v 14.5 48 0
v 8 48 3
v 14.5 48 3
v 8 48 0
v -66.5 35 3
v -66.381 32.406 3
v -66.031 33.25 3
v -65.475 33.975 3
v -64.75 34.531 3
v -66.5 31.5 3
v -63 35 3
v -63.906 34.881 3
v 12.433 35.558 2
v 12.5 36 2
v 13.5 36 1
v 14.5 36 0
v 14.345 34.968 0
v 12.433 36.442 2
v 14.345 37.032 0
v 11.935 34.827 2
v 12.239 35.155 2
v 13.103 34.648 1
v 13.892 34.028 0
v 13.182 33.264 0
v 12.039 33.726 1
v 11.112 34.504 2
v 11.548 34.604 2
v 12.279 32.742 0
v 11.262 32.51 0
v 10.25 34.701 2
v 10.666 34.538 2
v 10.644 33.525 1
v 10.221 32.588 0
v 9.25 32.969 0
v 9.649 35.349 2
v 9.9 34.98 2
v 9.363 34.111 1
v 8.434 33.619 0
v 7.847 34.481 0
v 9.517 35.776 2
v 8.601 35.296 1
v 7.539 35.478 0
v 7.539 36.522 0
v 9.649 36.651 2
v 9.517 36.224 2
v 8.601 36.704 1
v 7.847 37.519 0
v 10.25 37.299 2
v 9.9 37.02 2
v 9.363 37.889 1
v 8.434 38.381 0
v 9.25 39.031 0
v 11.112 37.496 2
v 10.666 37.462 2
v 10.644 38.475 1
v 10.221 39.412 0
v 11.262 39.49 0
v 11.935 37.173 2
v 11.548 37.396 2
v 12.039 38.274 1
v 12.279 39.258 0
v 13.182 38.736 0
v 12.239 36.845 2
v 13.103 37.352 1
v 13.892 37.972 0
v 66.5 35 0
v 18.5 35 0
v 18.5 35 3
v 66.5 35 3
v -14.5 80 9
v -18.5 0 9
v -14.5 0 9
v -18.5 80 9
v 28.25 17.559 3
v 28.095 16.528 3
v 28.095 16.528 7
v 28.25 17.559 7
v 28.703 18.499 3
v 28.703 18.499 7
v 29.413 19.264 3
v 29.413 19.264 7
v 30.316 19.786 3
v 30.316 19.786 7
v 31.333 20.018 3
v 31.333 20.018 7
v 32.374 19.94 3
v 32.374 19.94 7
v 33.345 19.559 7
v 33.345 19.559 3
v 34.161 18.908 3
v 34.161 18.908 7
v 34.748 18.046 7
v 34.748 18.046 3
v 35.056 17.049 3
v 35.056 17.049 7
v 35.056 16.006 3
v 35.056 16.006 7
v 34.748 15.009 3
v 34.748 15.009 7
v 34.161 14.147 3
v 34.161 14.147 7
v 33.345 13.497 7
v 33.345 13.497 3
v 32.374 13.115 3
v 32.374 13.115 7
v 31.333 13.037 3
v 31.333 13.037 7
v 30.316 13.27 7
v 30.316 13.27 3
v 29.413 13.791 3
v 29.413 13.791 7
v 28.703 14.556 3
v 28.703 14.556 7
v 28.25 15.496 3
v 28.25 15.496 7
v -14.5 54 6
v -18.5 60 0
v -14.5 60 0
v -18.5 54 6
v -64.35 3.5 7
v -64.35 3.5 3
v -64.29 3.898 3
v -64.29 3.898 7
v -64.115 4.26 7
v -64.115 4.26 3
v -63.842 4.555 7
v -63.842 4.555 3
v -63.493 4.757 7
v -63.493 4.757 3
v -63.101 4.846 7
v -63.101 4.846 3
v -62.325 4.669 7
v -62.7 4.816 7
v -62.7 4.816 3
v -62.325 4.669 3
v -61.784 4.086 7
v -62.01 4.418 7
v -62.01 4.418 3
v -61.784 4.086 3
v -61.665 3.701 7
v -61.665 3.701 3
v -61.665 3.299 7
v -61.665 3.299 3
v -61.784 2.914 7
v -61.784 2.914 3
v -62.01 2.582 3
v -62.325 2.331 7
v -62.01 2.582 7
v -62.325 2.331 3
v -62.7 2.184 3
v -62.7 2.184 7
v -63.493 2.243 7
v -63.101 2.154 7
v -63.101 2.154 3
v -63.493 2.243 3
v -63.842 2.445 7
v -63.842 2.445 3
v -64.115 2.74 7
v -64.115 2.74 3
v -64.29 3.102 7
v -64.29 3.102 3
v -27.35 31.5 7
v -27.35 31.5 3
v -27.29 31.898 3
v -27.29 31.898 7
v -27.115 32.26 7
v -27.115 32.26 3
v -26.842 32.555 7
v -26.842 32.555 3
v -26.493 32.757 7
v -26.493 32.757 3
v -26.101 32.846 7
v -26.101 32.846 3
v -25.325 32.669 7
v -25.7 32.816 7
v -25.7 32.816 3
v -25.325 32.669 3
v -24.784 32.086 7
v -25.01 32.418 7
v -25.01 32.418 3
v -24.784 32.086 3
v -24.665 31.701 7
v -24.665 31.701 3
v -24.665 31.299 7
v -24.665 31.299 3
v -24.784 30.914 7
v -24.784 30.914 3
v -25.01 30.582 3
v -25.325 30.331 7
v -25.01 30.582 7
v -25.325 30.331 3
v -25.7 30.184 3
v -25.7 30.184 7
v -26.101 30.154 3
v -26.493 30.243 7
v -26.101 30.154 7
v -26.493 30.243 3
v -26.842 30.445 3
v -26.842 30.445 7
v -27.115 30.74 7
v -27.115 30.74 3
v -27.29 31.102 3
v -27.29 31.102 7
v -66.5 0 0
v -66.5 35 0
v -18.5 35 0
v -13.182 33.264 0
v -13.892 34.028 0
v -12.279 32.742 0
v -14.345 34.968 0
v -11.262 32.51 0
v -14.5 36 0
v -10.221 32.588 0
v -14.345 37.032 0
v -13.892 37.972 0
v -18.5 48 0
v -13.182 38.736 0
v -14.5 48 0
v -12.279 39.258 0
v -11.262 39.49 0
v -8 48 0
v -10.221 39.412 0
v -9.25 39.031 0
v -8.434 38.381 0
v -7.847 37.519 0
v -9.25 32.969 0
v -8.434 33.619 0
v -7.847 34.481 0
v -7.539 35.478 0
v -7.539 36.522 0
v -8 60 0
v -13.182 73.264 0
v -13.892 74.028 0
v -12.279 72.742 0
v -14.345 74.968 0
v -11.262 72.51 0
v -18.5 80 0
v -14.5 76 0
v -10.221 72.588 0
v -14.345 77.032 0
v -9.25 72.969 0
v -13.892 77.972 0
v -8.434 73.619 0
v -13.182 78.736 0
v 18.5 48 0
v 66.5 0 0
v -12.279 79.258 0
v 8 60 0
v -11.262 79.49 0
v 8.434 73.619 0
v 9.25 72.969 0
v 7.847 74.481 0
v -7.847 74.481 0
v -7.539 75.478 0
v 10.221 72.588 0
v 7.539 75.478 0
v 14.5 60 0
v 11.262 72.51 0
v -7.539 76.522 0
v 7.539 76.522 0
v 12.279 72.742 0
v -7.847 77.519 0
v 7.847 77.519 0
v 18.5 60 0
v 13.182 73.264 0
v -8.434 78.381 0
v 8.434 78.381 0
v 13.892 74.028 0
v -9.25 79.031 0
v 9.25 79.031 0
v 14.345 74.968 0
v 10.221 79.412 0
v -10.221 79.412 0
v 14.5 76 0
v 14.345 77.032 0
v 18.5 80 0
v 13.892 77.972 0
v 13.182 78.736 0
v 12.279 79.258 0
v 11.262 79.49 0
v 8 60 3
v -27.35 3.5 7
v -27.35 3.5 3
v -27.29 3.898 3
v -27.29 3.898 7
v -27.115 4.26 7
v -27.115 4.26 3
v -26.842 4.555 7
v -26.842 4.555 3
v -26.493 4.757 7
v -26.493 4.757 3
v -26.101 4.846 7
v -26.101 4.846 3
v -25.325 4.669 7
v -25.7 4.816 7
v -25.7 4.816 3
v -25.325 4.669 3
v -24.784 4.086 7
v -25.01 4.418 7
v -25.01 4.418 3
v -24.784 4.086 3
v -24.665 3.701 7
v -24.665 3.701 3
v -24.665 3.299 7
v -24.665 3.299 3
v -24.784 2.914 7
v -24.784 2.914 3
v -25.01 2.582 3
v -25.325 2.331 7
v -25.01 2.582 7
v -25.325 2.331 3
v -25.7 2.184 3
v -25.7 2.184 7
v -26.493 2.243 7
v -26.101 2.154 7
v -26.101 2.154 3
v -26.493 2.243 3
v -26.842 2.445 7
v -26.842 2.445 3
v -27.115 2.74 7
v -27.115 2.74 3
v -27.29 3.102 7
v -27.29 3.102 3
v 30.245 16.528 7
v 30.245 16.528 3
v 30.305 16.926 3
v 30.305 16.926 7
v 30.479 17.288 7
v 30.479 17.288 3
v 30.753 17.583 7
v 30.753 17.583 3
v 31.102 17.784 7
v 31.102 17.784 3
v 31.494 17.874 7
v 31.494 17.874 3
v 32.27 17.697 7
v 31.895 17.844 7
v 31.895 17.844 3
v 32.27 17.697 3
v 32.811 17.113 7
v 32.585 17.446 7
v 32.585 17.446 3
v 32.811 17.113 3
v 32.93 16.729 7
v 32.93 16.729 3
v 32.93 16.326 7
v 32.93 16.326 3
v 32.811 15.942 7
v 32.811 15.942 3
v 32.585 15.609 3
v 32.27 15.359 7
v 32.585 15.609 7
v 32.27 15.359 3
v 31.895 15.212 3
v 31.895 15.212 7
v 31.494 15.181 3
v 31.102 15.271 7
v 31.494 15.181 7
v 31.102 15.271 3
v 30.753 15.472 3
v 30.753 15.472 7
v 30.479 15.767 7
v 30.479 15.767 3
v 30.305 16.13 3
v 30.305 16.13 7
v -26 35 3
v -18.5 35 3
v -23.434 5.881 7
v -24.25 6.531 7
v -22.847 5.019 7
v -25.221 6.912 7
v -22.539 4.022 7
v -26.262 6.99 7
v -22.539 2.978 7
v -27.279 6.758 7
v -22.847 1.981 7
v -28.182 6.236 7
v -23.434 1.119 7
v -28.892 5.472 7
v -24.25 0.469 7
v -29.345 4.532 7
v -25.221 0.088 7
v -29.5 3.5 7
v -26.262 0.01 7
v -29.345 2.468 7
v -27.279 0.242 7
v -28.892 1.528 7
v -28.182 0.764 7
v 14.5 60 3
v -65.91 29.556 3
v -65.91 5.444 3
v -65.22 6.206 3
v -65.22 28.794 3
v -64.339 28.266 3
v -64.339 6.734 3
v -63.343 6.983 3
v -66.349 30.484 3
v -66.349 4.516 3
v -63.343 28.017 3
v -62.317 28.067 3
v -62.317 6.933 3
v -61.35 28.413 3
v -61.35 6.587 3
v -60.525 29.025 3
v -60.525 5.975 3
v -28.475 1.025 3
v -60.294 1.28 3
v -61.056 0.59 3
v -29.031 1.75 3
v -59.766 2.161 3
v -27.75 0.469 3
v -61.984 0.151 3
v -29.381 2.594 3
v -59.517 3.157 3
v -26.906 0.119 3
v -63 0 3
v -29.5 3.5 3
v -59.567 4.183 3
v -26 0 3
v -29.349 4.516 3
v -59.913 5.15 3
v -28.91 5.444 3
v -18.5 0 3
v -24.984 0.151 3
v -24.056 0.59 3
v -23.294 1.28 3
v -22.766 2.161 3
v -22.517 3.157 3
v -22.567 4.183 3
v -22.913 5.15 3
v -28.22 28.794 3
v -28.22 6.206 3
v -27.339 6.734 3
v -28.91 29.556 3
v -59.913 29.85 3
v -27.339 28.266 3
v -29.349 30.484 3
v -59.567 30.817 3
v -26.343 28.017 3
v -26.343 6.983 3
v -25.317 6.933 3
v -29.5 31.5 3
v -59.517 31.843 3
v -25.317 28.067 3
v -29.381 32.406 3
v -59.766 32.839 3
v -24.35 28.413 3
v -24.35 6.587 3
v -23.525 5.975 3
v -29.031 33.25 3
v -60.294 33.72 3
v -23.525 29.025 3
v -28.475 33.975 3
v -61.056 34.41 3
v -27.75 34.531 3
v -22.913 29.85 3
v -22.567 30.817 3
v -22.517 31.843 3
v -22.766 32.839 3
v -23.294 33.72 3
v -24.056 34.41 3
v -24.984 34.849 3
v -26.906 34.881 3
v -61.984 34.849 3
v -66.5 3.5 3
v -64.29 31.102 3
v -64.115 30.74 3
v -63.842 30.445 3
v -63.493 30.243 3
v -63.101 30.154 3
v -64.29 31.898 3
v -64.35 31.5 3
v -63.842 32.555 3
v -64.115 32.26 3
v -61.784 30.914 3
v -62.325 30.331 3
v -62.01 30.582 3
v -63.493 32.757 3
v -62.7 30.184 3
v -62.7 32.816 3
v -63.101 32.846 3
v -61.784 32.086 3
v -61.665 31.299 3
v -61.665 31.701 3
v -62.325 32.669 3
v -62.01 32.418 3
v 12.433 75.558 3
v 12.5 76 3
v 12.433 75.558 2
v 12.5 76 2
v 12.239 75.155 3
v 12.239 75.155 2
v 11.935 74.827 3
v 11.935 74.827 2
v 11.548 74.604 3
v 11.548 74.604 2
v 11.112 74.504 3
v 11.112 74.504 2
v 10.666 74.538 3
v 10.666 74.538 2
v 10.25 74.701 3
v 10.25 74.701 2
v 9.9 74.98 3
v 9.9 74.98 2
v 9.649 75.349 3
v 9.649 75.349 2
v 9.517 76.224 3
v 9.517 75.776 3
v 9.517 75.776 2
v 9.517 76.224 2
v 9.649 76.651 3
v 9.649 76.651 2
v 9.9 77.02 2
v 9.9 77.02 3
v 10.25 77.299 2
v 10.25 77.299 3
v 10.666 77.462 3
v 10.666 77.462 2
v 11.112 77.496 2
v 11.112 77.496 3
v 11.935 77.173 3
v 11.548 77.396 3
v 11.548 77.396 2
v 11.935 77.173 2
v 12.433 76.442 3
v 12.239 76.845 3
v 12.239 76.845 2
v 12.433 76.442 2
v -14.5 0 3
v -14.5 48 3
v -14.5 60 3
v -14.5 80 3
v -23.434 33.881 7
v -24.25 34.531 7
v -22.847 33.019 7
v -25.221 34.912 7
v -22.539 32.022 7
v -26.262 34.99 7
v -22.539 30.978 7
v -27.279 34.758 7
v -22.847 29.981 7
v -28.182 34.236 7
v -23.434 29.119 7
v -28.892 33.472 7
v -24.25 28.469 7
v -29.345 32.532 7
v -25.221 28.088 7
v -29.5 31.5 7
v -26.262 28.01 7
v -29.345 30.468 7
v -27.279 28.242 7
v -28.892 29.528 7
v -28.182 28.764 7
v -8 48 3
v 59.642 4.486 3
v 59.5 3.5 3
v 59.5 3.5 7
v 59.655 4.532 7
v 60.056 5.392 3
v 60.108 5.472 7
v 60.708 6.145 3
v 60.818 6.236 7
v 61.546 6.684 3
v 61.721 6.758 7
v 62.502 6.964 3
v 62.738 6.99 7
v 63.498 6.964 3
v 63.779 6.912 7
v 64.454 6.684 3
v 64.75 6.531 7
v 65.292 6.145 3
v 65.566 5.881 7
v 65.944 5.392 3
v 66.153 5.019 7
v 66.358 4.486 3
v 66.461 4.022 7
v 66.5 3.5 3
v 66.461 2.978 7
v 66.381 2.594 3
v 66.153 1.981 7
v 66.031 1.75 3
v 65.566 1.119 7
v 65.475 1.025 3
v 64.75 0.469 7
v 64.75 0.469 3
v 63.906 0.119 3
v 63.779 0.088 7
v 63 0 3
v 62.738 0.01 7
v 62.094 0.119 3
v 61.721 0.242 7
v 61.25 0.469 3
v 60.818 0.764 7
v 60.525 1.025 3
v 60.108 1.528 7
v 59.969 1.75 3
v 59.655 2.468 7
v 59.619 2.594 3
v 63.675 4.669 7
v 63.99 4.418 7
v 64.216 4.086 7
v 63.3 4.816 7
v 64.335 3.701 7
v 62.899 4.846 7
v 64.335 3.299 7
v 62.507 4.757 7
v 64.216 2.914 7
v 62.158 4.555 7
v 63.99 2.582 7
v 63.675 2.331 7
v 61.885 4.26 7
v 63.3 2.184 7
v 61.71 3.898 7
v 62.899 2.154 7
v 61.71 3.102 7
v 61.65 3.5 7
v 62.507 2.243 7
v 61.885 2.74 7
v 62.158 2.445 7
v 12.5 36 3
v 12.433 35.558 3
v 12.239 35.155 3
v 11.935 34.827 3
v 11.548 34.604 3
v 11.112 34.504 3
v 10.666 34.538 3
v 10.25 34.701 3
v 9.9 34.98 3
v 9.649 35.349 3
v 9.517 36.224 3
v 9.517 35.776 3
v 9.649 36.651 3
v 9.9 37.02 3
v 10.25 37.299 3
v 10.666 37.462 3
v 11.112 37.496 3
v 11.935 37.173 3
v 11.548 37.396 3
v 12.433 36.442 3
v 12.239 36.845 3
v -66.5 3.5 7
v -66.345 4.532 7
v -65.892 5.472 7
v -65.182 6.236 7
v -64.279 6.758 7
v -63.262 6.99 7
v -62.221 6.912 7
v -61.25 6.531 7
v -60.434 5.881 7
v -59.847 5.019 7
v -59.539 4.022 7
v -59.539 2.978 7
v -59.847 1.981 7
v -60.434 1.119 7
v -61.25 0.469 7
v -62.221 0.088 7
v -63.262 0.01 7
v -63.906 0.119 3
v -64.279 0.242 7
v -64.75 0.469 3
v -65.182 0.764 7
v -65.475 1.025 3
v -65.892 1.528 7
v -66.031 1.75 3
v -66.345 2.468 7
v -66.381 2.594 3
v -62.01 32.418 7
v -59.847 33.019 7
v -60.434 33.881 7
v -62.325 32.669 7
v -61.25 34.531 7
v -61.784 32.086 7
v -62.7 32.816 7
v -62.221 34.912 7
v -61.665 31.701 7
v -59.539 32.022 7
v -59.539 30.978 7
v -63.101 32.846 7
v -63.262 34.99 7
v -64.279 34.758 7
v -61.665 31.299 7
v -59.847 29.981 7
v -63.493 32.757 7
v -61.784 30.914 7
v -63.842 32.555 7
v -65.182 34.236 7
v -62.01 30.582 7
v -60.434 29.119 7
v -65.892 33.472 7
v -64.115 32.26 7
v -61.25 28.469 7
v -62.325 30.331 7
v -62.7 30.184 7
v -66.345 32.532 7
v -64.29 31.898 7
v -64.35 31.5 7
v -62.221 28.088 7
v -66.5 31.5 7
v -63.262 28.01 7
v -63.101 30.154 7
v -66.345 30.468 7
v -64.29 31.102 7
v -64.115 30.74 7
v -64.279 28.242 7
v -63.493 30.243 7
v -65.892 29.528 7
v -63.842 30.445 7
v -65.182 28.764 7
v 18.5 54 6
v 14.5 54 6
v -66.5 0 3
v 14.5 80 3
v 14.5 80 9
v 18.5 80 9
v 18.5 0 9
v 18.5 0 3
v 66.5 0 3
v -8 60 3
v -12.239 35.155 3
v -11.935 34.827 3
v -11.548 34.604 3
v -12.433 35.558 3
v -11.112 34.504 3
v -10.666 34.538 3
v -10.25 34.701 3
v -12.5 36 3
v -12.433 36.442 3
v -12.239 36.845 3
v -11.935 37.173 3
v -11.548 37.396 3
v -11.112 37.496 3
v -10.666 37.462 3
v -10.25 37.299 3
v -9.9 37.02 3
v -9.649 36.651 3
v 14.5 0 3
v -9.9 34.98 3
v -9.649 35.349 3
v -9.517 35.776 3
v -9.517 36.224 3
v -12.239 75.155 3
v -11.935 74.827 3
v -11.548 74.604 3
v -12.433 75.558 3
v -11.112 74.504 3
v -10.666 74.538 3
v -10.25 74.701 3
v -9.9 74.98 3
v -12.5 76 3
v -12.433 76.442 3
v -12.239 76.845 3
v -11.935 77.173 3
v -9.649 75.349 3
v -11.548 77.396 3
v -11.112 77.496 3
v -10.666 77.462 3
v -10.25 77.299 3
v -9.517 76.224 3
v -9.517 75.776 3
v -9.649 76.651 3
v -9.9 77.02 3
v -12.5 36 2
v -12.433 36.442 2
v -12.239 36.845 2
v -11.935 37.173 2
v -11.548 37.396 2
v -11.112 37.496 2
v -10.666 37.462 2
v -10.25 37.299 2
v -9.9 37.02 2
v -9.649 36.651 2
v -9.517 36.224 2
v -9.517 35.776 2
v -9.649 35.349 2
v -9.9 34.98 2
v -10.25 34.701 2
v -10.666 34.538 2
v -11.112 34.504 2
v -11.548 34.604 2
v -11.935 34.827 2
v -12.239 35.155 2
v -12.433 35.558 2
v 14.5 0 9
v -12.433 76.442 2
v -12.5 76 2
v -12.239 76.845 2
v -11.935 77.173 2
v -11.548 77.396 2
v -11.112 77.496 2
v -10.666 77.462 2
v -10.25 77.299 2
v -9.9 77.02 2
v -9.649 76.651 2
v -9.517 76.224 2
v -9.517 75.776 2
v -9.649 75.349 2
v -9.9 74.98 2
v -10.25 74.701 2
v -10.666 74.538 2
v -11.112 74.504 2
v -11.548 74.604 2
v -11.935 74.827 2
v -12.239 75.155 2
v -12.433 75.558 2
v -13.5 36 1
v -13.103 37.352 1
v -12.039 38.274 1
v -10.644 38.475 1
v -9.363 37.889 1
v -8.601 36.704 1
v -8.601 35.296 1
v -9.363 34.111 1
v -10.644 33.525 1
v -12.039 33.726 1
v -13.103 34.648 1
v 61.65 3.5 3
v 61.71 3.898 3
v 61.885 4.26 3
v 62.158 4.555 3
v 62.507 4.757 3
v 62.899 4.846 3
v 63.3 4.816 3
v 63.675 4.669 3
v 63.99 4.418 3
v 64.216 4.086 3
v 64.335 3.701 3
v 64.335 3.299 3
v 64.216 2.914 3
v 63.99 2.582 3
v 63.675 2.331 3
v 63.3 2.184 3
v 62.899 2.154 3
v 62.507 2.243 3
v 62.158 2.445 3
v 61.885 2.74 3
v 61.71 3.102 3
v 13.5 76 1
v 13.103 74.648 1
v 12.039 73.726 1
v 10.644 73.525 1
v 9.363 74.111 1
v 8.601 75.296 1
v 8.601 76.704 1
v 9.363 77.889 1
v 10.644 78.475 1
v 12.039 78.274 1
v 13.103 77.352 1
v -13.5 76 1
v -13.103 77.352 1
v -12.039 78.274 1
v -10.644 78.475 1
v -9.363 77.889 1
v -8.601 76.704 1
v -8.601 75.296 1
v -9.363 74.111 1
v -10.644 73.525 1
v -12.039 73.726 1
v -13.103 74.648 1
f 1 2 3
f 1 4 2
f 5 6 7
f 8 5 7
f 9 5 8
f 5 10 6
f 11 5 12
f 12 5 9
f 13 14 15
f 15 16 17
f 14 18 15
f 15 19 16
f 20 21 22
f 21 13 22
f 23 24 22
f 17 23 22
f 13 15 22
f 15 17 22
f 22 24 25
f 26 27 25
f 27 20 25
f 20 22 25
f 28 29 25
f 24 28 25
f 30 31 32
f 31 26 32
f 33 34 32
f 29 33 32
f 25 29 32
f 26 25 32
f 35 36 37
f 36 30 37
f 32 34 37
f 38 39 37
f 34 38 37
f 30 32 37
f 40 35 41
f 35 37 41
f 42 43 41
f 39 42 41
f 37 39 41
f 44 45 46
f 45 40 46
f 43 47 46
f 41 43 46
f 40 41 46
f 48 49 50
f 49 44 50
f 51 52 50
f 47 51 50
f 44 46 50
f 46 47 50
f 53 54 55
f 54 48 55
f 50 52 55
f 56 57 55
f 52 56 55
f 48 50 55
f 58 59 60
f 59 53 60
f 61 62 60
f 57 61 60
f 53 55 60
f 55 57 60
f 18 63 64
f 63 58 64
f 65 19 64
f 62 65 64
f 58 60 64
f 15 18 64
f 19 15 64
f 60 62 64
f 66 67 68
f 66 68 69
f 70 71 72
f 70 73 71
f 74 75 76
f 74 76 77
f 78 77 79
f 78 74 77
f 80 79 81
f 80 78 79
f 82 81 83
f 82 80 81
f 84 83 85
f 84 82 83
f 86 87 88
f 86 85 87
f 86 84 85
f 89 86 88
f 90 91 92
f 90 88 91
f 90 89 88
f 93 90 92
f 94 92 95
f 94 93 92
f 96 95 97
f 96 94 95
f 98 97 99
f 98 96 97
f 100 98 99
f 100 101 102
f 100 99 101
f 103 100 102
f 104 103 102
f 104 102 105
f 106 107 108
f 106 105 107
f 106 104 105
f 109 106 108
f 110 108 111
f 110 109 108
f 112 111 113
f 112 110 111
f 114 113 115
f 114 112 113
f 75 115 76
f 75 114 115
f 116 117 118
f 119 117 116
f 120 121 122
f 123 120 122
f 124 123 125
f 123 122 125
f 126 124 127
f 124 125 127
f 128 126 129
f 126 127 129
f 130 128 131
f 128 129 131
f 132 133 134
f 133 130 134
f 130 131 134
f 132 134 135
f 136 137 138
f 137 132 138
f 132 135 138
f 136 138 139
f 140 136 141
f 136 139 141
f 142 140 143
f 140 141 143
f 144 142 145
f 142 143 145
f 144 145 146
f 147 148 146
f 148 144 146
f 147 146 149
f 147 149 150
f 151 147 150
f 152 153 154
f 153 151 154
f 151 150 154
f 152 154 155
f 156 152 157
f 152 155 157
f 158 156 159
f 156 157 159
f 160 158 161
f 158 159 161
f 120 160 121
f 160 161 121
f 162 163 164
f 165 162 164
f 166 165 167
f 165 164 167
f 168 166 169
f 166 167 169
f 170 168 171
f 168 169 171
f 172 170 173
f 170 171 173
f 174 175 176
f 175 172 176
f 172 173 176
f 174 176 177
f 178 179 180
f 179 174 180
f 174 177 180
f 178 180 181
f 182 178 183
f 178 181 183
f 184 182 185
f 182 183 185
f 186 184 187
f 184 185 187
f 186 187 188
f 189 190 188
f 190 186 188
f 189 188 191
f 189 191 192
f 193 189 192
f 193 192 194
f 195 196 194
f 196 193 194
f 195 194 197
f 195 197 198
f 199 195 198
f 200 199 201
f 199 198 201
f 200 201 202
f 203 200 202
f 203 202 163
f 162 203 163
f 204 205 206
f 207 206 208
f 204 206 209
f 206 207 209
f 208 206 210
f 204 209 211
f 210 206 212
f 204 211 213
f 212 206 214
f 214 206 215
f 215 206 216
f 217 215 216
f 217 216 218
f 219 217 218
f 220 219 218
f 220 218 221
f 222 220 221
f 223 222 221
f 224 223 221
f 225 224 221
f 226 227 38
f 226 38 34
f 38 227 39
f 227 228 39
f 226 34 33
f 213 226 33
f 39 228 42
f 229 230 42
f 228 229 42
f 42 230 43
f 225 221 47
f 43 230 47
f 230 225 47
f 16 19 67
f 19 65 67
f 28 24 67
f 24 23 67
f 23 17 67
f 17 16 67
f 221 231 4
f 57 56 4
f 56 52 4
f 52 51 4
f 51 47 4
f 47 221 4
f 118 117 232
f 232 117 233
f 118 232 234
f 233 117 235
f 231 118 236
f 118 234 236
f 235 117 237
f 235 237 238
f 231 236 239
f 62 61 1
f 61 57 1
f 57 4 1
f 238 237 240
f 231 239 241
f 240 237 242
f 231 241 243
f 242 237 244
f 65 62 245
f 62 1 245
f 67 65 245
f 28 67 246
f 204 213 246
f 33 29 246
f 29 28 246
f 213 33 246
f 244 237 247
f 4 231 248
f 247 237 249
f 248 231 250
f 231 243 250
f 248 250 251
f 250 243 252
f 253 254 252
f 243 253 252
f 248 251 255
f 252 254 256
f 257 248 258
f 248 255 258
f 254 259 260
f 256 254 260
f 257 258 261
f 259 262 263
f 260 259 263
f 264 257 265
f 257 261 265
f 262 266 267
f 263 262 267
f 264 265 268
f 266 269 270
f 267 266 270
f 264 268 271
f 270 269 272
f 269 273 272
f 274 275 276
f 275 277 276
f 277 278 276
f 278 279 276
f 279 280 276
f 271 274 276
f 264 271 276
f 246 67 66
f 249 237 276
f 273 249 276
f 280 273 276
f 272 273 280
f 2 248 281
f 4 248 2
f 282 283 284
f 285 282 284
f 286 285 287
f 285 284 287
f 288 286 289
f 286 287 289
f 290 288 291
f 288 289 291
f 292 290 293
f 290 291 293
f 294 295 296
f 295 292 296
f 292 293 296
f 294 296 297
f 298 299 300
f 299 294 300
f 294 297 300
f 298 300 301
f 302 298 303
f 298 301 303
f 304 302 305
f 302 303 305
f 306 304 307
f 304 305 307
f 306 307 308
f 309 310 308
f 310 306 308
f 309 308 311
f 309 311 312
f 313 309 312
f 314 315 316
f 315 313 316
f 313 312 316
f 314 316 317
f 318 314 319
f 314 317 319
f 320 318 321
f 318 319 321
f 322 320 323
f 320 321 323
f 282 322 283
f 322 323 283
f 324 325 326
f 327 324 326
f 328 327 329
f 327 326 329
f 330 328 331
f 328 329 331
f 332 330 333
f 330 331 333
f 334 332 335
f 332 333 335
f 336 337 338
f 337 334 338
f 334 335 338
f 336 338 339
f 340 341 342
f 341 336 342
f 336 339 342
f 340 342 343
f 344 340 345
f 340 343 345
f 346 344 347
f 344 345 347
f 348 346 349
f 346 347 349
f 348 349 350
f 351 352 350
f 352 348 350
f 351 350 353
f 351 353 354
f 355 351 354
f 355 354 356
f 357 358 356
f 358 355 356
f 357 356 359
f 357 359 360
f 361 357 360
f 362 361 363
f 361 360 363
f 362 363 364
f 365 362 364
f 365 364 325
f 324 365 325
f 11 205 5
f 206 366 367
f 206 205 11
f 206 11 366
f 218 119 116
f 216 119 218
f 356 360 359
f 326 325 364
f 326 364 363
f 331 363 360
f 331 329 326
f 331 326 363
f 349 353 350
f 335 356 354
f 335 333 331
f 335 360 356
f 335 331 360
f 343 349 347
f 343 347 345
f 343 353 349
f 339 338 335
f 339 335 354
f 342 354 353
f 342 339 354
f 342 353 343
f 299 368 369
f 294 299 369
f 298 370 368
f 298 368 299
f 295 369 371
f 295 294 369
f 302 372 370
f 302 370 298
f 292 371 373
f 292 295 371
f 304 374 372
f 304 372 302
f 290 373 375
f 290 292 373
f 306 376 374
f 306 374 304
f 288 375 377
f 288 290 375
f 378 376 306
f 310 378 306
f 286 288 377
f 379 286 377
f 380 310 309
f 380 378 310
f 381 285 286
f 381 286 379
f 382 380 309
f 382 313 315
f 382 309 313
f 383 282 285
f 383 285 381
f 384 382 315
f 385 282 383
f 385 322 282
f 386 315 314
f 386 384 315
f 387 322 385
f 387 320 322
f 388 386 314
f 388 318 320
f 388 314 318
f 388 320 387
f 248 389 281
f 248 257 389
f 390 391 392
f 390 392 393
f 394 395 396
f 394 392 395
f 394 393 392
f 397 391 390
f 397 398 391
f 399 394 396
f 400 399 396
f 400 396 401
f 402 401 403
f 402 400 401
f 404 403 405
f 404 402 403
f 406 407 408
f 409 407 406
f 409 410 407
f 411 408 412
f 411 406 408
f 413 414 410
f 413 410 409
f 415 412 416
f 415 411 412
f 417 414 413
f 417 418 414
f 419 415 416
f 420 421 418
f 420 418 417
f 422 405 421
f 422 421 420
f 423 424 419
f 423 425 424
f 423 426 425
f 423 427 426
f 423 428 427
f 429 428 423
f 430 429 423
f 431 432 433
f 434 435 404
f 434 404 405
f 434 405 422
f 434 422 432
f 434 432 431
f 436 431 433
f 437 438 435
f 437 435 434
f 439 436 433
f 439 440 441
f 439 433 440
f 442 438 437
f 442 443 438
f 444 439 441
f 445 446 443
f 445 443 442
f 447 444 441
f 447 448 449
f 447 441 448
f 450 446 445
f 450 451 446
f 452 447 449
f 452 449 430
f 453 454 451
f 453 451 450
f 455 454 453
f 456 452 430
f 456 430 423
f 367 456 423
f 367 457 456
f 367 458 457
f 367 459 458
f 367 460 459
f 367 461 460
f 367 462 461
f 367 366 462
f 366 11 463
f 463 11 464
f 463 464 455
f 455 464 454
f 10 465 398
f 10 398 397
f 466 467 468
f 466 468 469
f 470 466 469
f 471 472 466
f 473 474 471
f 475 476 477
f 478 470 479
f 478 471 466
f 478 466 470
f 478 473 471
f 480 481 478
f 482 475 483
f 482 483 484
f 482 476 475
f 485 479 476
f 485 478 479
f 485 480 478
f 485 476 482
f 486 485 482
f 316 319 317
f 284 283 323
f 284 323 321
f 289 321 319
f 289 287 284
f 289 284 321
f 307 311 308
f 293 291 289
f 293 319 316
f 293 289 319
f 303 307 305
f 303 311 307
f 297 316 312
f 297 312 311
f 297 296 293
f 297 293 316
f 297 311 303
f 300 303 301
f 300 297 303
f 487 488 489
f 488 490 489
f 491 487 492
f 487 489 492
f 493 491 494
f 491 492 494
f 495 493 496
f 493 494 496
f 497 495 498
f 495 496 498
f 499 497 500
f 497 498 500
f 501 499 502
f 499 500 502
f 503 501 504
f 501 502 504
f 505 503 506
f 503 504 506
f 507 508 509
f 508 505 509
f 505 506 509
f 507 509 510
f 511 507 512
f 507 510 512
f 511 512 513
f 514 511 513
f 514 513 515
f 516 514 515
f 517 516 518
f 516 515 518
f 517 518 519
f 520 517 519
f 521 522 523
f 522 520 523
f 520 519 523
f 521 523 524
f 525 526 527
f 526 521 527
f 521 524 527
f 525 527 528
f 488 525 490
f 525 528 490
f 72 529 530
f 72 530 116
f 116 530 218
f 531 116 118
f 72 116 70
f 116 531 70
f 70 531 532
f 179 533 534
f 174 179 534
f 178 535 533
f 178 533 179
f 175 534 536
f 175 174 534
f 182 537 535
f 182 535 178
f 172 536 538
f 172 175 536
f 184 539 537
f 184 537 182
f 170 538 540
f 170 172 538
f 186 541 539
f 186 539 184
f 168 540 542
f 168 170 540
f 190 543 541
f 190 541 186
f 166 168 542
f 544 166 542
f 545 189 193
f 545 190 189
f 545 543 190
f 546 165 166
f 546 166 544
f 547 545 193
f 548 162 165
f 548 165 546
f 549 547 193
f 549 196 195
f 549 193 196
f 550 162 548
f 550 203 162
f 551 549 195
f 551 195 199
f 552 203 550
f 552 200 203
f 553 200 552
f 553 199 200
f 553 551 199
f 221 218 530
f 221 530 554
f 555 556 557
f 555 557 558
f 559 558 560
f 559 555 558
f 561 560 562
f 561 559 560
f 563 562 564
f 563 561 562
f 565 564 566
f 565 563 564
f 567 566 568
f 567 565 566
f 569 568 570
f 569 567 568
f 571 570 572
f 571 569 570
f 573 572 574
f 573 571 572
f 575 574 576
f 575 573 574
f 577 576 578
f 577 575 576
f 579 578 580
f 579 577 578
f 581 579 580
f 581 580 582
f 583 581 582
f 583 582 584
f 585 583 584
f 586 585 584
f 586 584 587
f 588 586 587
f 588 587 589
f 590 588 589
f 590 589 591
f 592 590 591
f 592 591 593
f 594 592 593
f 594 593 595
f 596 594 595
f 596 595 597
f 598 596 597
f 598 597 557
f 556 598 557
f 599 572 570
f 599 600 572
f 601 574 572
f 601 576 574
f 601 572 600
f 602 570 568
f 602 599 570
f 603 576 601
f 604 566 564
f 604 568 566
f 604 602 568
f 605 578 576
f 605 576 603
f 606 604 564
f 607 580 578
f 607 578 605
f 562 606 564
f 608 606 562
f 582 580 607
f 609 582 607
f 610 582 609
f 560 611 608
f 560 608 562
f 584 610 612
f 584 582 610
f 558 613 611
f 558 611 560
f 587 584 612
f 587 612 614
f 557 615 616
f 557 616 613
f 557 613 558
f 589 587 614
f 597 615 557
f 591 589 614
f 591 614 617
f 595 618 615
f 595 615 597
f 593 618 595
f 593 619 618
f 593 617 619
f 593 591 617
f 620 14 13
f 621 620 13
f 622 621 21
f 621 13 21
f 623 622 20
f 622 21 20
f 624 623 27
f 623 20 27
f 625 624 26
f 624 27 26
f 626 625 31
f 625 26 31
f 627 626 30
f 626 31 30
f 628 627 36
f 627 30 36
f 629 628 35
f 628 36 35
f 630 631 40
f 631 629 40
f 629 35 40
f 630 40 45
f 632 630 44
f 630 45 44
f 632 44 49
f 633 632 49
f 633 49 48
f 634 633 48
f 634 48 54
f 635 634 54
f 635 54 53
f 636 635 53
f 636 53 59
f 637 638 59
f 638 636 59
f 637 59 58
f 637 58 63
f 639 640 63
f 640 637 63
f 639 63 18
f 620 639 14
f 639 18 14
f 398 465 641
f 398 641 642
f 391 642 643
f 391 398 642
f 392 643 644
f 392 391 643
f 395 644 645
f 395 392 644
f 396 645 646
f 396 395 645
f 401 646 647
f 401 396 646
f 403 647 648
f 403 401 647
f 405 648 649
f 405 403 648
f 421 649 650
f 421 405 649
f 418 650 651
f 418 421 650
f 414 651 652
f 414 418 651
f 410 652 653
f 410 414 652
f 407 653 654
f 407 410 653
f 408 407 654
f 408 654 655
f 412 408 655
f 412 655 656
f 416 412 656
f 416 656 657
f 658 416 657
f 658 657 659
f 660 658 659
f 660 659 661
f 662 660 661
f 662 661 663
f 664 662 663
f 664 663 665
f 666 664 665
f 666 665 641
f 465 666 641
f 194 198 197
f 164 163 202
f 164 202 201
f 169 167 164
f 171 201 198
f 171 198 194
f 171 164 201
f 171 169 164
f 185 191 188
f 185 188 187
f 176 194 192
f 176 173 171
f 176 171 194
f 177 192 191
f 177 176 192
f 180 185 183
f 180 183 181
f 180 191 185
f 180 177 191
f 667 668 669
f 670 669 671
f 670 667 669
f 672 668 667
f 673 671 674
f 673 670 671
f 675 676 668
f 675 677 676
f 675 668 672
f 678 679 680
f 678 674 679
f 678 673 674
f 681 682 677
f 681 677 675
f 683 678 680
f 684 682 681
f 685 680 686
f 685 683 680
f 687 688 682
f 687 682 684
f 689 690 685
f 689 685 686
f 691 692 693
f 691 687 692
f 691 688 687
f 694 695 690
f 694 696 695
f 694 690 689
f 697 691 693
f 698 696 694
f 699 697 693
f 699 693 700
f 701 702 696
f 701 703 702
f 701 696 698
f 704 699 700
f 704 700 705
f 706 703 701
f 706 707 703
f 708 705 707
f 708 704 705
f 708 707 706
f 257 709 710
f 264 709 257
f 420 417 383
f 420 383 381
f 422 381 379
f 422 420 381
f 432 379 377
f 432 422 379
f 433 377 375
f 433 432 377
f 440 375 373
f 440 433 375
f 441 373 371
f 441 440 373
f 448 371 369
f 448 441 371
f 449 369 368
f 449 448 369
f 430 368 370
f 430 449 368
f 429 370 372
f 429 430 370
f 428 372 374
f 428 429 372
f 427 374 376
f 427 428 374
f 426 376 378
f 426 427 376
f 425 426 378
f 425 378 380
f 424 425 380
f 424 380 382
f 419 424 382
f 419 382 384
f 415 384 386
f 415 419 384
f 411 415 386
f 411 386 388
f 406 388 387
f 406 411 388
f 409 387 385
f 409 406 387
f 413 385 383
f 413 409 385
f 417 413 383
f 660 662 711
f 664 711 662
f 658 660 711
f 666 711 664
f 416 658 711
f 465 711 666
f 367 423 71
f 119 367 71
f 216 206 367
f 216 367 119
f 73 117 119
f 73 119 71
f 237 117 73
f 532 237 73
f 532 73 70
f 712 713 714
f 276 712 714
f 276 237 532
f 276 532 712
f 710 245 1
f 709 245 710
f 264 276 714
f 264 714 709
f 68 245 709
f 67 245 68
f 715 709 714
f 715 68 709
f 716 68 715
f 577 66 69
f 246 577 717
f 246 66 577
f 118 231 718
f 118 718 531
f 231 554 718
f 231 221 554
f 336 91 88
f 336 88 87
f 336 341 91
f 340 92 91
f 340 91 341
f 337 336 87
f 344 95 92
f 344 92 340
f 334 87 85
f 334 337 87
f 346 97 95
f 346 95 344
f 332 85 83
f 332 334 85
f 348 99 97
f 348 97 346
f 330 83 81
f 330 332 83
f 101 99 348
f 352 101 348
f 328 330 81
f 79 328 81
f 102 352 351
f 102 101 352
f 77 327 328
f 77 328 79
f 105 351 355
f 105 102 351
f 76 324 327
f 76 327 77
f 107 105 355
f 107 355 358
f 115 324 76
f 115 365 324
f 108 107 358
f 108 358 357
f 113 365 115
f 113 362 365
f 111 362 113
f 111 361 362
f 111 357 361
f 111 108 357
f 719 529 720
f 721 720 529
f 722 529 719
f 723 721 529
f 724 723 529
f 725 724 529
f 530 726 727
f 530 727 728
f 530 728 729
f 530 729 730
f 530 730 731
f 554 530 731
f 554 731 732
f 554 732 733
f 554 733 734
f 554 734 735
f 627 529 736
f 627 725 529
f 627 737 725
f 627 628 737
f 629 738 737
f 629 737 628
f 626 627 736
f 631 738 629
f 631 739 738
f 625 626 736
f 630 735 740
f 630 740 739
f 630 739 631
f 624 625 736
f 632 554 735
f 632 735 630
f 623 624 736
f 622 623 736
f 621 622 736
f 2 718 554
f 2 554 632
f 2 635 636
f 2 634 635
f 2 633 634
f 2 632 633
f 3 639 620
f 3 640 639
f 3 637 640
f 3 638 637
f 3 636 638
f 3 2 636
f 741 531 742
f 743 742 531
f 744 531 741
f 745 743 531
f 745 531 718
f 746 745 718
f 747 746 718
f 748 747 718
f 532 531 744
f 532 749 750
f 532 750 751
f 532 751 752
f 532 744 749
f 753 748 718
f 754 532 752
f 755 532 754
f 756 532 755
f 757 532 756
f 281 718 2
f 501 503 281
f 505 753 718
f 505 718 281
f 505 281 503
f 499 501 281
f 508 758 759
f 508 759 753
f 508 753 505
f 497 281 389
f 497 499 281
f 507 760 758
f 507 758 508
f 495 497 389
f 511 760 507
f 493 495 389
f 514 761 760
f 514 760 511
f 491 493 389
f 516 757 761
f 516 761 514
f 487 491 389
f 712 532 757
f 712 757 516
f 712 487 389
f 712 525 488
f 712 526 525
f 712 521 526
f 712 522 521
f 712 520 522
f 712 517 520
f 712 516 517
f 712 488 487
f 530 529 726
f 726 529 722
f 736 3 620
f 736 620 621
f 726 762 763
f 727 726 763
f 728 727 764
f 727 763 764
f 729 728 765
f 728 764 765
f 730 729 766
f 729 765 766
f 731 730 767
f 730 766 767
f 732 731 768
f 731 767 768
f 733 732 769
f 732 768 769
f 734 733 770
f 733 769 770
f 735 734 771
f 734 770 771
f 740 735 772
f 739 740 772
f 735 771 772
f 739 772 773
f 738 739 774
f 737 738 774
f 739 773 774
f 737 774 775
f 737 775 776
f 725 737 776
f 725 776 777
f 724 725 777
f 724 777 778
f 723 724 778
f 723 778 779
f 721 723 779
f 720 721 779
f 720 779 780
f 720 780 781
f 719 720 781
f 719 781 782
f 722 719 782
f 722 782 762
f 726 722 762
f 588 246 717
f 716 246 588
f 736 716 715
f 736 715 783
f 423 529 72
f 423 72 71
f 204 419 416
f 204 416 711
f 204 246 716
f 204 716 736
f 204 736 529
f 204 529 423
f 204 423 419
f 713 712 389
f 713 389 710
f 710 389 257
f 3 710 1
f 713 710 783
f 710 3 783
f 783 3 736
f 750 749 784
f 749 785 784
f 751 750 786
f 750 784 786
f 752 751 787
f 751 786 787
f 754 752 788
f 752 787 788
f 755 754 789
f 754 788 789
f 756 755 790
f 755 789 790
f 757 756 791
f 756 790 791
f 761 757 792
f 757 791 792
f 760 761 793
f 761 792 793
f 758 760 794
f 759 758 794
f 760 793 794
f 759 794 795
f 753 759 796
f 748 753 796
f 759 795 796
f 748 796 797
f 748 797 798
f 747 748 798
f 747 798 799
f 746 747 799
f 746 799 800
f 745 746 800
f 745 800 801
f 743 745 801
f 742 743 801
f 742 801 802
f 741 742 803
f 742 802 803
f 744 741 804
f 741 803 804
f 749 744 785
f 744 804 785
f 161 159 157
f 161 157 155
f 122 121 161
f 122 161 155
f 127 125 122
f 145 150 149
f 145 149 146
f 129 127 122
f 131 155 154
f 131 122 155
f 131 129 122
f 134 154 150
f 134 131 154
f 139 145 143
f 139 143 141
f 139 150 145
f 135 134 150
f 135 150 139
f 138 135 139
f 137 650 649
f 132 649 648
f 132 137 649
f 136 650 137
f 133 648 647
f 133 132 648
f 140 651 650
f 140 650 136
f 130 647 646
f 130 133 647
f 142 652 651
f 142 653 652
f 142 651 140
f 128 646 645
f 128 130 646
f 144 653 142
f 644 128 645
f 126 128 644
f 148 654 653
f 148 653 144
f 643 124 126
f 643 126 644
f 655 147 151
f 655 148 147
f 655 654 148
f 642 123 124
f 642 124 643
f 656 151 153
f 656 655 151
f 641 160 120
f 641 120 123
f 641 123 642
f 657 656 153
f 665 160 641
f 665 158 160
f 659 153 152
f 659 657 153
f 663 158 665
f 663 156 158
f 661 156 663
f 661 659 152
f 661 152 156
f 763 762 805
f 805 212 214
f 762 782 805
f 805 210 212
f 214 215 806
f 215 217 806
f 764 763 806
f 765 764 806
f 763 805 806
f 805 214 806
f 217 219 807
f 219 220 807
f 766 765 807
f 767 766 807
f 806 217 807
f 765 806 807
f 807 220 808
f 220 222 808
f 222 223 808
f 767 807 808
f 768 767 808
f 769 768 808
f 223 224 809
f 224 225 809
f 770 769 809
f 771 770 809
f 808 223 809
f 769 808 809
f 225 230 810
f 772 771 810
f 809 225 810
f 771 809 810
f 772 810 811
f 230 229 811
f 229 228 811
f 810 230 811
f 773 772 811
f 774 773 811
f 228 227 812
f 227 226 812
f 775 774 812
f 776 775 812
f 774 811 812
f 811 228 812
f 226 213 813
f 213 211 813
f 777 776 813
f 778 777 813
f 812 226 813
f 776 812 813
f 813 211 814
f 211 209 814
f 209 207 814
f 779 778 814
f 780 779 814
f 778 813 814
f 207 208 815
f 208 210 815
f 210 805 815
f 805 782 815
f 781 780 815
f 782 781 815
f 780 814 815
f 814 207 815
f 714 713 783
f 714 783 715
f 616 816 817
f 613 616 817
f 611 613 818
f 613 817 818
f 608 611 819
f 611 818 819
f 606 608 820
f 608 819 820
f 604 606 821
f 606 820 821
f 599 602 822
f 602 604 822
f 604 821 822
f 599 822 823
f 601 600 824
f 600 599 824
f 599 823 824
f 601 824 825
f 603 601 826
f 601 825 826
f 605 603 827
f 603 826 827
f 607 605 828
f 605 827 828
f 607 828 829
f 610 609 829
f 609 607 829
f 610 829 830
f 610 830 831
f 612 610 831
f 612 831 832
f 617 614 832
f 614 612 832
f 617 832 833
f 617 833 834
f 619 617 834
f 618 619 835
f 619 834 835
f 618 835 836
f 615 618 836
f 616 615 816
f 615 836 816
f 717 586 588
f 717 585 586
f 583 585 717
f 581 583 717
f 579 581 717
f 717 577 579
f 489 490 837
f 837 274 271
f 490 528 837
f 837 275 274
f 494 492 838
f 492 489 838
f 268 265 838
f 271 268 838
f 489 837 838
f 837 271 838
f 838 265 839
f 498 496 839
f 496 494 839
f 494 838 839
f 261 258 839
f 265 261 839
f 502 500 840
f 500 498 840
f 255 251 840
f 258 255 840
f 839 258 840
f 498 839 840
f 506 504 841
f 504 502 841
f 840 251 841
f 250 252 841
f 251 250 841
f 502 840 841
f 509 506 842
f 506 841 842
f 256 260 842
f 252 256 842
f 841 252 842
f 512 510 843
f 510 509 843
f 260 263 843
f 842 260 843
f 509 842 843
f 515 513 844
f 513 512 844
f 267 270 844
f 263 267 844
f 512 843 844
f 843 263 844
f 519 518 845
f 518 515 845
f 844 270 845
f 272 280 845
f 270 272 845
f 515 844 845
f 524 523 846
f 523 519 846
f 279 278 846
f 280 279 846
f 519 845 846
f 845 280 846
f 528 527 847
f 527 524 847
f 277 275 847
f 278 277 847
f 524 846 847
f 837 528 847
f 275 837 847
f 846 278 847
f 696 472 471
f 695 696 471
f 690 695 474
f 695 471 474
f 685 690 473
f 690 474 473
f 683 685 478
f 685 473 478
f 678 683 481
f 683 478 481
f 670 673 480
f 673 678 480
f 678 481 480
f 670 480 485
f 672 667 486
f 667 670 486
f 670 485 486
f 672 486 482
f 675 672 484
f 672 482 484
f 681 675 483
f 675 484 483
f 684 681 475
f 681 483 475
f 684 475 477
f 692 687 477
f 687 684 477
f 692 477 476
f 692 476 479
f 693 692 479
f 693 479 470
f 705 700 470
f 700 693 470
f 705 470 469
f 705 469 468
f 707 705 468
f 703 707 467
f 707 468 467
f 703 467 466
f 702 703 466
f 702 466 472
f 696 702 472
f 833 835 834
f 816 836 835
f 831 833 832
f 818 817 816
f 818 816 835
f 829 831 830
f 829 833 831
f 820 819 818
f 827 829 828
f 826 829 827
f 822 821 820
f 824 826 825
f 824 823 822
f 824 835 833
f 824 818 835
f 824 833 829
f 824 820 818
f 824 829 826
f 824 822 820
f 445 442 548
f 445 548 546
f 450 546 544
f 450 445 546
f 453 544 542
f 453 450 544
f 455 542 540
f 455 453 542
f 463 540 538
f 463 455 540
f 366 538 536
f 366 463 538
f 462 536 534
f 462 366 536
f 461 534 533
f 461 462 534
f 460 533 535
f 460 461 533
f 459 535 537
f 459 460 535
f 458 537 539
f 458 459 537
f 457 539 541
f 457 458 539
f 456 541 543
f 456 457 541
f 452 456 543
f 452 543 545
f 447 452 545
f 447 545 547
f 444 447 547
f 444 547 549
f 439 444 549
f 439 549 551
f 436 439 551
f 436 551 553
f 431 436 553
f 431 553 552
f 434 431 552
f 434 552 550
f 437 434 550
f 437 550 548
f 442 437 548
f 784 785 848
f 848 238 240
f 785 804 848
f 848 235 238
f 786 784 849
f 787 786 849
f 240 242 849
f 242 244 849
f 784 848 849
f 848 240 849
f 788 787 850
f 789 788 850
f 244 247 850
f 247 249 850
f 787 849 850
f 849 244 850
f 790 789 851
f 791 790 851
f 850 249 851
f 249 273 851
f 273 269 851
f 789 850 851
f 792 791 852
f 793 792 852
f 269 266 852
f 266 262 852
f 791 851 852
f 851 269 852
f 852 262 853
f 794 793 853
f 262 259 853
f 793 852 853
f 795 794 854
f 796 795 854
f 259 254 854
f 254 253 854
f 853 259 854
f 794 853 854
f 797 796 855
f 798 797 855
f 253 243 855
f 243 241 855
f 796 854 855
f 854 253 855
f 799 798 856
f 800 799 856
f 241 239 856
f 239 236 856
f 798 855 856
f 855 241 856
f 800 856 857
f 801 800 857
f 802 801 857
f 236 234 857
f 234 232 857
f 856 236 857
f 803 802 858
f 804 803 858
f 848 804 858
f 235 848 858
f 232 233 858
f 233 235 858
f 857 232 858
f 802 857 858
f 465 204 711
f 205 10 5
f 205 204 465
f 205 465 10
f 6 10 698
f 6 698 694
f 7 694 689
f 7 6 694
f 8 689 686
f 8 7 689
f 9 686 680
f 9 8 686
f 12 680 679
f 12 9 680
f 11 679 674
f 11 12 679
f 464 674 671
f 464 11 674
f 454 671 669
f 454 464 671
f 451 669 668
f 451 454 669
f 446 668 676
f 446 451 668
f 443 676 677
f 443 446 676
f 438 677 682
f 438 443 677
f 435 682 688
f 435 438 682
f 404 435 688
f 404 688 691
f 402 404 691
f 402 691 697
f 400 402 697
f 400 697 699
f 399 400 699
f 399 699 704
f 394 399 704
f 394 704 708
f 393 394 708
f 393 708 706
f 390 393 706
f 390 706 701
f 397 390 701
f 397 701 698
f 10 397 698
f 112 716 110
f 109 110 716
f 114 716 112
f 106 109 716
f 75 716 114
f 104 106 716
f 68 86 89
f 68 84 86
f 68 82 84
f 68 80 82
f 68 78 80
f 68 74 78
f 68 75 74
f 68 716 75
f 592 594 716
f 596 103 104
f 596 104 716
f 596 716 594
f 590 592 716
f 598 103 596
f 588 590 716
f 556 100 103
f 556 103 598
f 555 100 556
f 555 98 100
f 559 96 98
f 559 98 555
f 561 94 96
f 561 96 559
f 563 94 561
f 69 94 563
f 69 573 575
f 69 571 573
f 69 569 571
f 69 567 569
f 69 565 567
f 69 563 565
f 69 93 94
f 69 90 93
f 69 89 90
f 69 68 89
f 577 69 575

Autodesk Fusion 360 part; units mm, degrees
sketch "Sketch1" plane through (0, 0, 0) normal (0, 0, 1) x (1, 0, 0) in component "Base"
  line L0 (0, 0) -> (0, 80)
  line L1 (0, 80) -> (18.5, 80)
  line L2 (18.5, 80) -> (18.5, 35)
  line L3 (18.5, 35) -> (66.5, 35)
  line L4 (66.5, 35) -> (66.5, 0)
  line L5 (66.5, 0) -> (0, 0)
  circle A0 centre (11, 76) radius 1.5
  circle A1 centre (11, 36) radius 1.5
  line L6 (14.5, 80) -> (14.5, 0)
  line L7 (18.5, 35) -> (18.5, 0)
  line L8 (8, 60) -> (8, 48)
  line L9 (8, 48) -> (14.5, 48)
  line L10 (14.5, 48) -> (14.5, 60)
  line L11 (14.5, 60) -> (8, 60)
  dimension "d1" = 80
  dimension "d4" = 3
  dimension "d5" = 11
  dimension "d8" = 0
  dimension "d9" = -40
  dimension "d10" = 4
  dimension "d17" = 14.5
  dimension "d18" = 4
  dimension "d21" = 48
  dimension "d22" = 35
  dimension "d100" = 12
  dimension "d101" = 16
  dimension "d102" = 14.5
  dimension "d103" = 8
extrude "Extrude1" add sketch "Sketch1" along normal blind 3 contours L0 L1 L5 L6 L8 L9 L11 | L1 L2 L5 L6 L7 L10 | L3 L4 L5 L7 in component "Base"
extrude "Extrude2" add sketch "Sketch1" along normal blind 9 contours L1 L2 L5 L6 L7 L10 in component "Base"
chamfer "Chamfer1" distance 2 angle 45 2 edges at (9.6015, 76.5424, 0) (9.6015, 36.5424, 0) in component "Base"
sketch "Sketch7" plane through (18.5, 0, 0) normal (1, 0, 0) x (0, 1, 0) in component "Base"
  line L0 (35, 0) -> (80, 0)
  line L1 (80, 0) -> (80, 9)
  line L2 (80, 9) -> (0, 9)
  line L3 (0, 9) -> (0, 3)
  line L4 (0, 3) -> (35, 3)
  line L5 (35, 3) -> (35, 0)
  line L6 (48, 0) -> (54, 6)
  line L7 (54, 6) -> (60, 0)
  line L8 (48, 0) -> (60, 0)
  dimension "d104" = 45
  dimension "d105" = 45
  dimension "d106" = 20
  dimension "d107" = 12
extrude "Extrude10" cut sketch "Sketch7" against normal blind 4 contours L0 L6 L7 L8 in component "Base"
mirror "Mirror1" about plane through (0, 0, 0) normal (1, 0, 0) of bodies 1 merged in component "Base"
sketch "Sketch2" plane through (0, 0, 3) normal (0, 0, 1) x (-1, 0, 0) in component "Base"
  line L0 (18.5, 0) -> (18.5, -35)
  line L1 (18.5, -35) -> (66.5, -35)
  line L2 (66.5, -35) -> (66.5, 0)
  line L3 (66.5, 0) -> (18.5, 0)
  circle A0 centre (63, -31.5) radius 3.5
  circle A1 centre (26, -31.5) radius 3.5
  circle A2 centre (63, -3.5) radius 3.5
  circle A3 centre (26, -3.5) radius 3.5
  circle A4 centre (63, -31.5) radius 1.35
  circle A5 centre (26, -31.5) radius 1.35
  circle A6 centre (63, -3.5) radius 1.35
  circle A7 centre (26, -3.5) radius 1.35
  dimension "d23" = 7
  dimension "d26" = -37
  dimension "d27" = 28
  dimension "d97" = 2.7
extrude "Extrude3" add sketch "Sketch2" along normal blind 4 contours A1 | A3 | A2 | A0 in component "Base"
sketch "Sketch5" plane through (0, 0, 3) normal (0, 0, 1) x (-1, 0, 0) in component "Base"
  line L0 (-18.5, -35) -> (-18.5, 0)
  line L1 (-18.5, 0) -> (-66.5, 0)
  line L2 (-66.5, 0) -> (-66.5, -35)
  line L3 (-66.5, -35) -> (-18.5, -35)
  circle A0 centre (-31.5949, -16.5277) radius 3.5
  circle A1 centre (-63, -3.5) radius 3.5
  circle A2 centre (-31.5949, -16.5277) radius 1.35
  circle A3 centre (-63, -3.5) radius 1.35
  line L4 (-66.5, -35) -> (-66.5, 0)
  line L5 (-66.5, 0) -> (0, 0)
  dimension "d68" = 7
  dimension "d69" = 7
  dimension "d70" = 34
  dimension "d93" = 2.7
  dimension "d94" = 2.7
extrude "Extrude8" add sketch "Sketch5" along normal blind 4 contours A1 | A0 in component "Base"
component "Base" placed x (1, 0, 0) y (0, 1, 0) z (0, 0, 1) at (0, 0, 0)
equation "d5 = ( 22 / 2 ) * 1 mm"
equation "d17 = ( 29 / 2 ) * 1 mm"
